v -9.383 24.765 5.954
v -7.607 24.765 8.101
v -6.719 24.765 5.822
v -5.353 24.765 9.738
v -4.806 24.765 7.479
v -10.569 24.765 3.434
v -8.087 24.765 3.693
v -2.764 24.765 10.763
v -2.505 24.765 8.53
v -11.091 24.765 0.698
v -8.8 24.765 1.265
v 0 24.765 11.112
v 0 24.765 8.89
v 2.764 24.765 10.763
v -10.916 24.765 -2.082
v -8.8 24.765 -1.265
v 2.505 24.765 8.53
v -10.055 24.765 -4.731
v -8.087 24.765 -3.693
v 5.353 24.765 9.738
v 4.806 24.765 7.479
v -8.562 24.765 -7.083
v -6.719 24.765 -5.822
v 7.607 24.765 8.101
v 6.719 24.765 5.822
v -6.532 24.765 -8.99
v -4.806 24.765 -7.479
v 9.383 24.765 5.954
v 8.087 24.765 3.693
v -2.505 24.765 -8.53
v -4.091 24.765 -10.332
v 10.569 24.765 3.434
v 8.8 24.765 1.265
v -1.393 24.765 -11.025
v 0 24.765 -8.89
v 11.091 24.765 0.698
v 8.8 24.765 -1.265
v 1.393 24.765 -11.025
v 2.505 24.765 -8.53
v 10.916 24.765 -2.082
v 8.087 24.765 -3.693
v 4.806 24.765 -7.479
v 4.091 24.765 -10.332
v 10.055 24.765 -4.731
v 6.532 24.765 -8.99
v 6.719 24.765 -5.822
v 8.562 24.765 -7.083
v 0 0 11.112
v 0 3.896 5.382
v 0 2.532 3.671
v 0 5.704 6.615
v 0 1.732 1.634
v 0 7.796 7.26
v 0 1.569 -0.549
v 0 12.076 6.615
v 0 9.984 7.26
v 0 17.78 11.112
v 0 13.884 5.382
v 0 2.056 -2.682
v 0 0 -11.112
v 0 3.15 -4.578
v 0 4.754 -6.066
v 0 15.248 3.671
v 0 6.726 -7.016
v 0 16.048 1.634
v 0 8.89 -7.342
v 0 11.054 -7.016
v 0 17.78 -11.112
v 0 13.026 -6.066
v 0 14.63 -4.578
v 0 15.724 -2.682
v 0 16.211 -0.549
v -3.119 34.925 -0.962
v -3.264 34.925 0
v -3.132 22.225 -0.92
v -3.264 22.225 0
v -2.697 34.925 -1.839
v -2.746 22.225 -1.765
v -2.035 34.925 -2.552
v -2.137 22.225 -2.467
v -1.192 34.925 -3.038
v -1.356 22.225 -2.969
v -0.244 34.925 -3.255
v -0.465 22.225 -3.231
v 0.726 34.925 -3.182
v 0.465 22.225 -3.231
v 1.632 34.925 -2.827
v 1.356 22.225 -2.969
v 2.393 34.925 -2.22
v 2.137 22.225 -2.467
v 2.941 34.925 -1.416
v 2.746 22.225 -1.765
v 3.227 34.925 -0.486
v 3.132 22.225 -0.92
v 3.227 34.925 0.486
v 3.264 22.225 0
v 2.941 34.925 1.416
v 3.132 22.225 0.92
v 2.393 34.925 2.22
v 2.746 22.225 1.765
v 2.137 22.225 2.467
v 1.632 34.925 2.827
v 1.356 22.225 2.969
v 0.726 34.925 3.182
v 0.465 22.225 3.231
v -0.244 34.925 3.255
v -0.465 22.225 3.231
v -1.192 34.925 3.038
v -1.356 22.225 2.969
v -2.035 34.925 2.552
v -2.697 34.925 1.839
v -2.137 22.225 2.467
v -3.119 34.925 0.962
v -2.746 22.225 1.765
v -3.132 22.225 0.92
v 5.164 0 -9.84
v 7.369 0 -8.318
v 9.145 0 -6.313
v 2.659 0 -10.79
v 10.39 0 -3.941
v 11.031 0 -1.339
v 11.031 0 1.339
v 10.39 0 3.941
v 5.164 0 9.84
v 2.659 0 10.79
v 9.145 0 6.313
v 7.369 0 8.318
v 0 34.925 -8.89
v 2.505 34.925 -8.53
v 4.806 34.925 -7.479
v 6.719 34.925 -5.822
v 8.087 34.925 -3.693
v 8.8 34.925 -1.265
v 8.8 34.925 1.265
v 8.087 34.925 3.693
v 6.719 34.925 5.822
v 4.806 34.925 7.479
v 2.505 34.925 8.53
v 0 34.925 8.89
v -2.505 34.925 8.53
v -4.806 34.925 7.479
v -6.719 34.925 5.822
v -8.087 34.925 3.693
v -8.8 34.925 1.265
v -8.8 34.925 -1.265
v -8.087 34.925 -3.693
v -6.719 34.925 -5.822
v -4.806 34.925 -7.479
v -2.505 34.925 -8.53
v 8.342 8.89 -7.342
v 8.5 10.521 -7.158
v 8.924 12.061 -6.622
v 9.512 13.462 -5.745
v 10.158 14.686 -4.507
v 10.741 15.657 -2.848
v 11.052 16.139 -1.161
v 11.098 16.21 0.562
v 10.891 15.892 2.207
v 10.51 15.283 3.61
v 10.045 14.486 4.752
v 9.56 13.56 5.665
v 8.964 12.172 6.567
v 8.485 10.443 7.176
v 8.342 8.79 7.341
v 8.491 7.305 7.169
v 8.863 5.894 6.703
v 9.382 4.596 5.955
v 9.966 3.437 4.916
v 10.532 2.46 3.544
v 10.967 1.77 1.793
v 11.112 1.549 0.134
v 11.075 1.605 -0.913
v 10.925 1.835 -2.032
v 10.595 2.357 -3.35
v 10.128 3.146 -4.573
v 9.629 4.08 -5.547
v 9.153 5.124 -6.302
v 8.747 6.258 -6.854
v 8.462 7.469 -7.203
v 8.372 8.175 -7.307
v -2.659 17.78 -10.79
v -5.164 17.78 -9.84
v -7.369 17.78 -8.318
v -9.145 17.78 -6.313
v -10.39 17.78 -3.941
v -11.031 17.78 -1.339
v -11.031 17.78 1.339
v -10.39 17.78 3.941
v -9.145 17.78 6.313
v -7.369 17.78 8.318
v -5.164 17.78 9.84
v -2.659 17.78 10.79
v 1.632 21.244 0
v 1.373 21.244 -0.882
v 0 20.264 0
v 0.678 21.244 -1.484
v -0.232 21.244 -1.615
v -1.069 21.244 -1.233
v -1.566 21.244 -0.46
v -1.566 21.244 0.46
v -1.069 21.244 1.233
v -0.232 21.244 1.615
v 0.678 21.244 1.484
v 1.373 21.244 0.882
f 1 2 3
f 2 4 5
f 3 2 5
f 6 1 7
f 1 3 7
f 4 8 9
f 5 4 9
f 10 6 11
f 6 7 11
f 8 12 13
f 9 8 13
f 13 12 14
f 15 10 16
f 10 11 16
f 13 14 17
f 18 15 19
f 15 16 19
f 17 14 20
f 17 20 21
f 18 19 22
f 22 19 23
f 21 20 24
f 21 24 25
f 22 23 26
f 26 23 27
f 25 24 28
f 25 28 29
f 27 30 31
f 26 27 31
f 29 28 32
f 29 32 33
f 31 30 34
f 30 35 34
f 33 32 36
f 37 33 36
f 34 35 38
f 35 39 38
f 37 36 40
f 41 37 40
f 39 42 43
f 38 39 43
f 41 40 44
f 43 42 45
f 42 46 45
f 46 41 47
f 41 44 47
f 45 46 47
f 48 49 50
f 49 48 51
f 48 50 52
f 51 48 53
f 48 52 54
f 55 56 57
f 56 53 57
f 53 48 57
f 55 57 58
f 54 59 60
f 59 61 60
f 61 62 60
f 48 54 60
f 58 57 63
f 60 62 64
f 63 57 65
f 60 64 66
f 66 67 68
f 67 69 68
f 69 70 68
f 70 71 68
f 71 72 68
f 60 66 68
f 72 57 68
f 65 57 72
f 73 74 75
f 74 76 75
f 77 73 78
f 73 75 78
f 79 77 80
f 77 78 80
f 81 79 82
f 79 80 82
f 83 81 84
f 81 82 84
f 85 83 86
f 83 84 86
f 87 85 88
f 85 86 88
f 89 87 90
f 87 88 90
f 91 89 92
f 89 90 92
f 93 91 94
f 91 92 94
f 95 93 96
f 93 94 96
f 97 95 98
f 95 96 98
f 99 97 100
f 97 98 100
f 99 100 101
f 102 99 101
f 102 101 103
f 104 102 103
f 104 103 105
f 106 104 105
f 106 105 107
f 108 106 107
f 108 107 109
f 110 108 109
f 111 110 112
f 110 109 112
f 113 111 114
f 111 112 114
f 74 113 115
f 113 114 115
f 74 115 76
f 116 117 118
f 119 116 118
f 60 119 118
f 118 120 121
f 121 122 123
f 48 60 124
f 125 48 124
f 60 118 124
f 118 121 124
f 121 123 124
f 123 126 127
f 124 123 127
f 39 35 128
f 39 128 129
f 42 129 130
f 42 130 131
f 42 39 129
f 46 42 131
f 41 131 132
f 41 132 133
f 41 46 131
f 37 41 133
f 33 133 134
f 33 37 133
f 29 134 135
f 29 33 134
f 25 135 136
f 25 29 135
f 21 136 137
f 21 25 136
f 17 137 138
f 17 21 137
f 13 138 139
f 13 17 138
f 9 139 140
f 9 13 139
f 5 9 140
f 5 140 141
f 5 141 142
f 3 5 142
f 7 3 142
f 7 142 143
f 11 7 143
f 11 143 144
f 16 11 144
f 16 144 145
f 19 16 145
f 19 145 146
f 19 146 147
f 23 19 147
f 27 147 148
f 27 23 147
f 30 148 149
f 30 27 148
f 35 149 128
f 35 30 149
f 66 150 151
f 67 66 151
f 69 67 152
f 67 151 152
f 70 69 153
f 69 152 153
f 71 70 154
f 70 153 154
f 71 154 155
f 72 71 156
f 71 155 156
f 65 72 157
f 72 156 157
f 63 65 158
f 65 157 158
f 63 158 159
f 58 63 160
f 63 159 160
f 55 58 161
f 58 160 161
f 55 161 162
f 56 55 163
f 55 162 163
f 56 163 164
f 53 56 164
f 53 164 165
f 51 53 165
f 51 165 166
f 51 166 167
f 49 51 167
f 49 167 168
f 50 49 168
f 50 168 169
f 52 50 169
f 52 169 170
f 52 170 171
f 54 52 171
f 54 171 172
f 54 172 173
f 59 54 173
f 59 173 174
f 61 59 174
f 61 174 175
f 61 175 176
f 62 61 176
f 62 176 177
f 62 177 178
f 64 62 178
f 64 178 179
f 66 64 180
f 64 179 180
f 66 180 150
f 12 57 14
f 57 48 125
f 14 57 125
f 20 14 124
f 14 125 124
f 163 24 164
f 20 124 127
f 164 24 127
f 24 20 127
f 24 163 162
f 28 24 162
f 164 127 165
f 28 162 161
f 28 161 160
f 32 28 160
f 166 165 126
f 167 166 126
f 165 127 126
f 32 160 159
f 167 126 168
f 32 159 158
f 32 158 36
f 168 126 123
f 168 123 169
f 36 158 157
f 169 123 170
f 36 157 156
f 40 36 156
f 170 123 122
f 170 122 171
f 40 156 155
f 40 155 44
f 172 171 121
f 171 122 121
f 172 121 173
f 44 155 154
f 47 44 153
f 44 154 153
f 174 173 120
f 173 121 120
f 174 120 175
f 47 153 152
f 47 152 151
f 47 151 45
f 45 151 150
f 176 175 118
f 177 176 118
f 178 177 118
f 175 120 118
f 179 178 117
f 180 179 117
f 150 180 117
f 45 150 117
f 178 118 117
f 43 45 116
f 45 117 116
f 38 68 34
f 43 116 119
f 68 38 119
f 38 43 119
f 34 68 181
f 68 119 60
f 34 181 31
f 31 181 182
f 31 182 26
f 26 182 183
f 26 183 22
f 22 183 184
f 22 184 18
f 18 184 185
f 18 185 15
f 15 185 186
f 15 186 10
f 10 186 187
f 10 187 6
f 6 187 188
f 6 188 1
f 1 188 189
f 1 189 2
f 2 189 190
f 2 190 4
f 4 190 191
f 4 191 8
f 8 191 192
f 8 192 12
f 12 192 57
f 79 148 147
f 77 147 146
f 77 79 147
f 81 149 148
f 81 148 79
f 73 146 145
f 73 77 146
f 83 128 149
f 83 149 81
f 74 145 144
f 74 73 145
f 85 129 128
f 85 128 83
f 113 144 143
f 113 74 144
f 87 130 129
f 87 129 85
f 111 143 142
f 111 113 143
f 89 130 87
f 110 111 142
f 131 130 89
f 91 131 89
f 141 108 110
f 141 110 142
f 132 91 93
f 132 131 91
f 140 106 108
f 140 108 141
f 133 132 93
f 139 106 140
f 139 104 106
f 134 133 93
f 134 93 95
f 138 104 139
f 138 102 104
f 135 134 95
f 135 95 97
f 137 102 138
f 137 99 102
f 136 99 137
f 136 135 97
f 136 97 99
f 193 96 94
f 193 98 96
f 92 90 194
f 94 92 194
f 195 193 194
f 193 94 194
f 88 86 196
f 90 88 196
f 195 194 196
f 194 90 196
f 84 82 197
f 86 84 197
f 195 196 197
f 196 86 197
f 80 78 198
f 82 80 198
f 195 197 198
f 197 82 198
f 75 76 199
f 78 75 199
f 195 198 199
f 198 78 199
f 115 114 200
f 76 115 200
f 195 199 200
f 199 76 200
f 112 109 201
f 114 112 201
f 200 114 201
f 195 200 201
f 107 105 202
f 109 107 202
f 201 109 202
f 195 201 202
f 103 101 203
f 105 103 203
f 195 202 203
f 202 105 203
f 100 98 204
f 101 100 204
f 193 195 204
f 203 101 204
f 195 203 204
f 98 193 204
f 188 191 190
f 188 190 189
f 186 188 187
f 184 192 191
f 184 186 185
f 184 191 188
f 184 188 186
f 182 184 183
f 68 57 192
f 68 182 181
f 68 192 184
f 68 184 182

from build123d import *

# Parameters (mm, degrees)
CROQUIS1_R                     = 11.1125
SALIENTE_EXTRUIR1_DEPTH        = 34.925
CORTAR_EXTRUIR2_START          = 10.16
CROQUIS12_R                    = 11.1125
CROQUIS12_R_2                  = 8.89
CORTAR_EXTRUIR2_DEPTH          = 10.16
TALADRO_ROSCADO_5_16_181_D     = 6.5278
TALADRO_ROSCADO_5_16_181_DEPTH = 12.7
TALADRO_ROSCADO_5_16_181_TIP   = 1.961148974
CROQUIS6_W                     = 22.225
CROQUIS6_H                     = 17.78
CORTAR_EXTRUIR1_DEPTH          = 25.4
TALADRO_ROSCADO_5_8_181_D      = 14.68374
TALADRO_ROSCADO_5_8_181_DEPTH  = 38.7985
TALADRO_ROSCADO_5_8_181_TIP    = 4.411440553


with BuildPart() as part:
    # Croquis1 → Saliente-Extruir1 (new body)
    with BuildSketch(Plane(origin=(0, 0, 0), x_dir=(1, 0, 0), z_dir=(0, 1, 0))):
        with Locations(Location((0, 0, 0), (0, 0, 270))):
            Circle(CROQUIS1_R)
    extrude(amount=SALIENTE_EXTRUIR1_DEPTH)

    # Croquis12 → Cortar-Extruir2 (cut)
    with BuildSketch(Plane.XZ.offset(-34.925).offset(CORTAR_EXTRUIR2_START)):
        with Locations(Location((0, 0, 0), (0, 0, 270))):
            Circle(CROQUIS12_R)
        with Locations(Location((0, 0, 0), (0, 0, 270))):
            Circle(CROQUIS12_R_2, mode=Mode.SUBTRACT)
    extrude(amount=-CORTAR_EXTRUIR2_DEPTH, mode=Mode.SUBTRACT)

    # Taladro roscado 5/16-181
    with Locations(Plane(origin=(0, 34.925, 0), x_dir=(1, 0, 0), z_dir=(0, 1, 0))):
        with Locations((0, 0)):
            Hole(TALADRO_ROSCADO_5_16_181_D / 2, depth=TALADRO_ROSCADO_5_16_181_DEPTH)
            with Locations((0, 0, -(TALADRO_ROSCADO_5_16_181_DEPTH + TALADRO_ROSCADO_5_16_181_TIP / 2))):  # 118° drill point
                Cone(0, TALADRO_ROSCADO_5_16_181_D / 2, TALADRO_ROSCADO_5_16_181_TIP, mode=Mode.SUBTRACT)

    # Croquis6 → Cortar-Extruir1 (cut)
    with BuildSketch(Plane(origin=(0, 0, 0), x_dir=(0, 0, -1), z_dir=(1, 0, 0))):
        with Locations((0, 8.89)):
            Rectangle(CROQUIS6_W, CROQUIS6_H)
    extrude(amount=-CORTAR_EXTRUIR1_DEPTH, mode=Mode.SUBTRACT)

    # Taladro roscado 5/8-181
    with Locations(Plane.ZY):
        with Locations((0, 8.89)):
            Hole(TALADRO_ROSCADO_5_8_181_D / 2, depth=TALADRO_ROSCADO_5_8_181_DEPTH)
            with Locations((0, 0, -(TALADRO_ROSCADO_5_8_181_DEPTH + TALADRO_ROSCADO_5_8_181_TIP / 2))):  # 118° drill point
                Cone(0, TALADRO_ROSCADO_5_8_181_D / 2, TALADRO_ROSCADO_5_8_181_TIP, mode=Mode.SUBTRACT)


solid = part.part
